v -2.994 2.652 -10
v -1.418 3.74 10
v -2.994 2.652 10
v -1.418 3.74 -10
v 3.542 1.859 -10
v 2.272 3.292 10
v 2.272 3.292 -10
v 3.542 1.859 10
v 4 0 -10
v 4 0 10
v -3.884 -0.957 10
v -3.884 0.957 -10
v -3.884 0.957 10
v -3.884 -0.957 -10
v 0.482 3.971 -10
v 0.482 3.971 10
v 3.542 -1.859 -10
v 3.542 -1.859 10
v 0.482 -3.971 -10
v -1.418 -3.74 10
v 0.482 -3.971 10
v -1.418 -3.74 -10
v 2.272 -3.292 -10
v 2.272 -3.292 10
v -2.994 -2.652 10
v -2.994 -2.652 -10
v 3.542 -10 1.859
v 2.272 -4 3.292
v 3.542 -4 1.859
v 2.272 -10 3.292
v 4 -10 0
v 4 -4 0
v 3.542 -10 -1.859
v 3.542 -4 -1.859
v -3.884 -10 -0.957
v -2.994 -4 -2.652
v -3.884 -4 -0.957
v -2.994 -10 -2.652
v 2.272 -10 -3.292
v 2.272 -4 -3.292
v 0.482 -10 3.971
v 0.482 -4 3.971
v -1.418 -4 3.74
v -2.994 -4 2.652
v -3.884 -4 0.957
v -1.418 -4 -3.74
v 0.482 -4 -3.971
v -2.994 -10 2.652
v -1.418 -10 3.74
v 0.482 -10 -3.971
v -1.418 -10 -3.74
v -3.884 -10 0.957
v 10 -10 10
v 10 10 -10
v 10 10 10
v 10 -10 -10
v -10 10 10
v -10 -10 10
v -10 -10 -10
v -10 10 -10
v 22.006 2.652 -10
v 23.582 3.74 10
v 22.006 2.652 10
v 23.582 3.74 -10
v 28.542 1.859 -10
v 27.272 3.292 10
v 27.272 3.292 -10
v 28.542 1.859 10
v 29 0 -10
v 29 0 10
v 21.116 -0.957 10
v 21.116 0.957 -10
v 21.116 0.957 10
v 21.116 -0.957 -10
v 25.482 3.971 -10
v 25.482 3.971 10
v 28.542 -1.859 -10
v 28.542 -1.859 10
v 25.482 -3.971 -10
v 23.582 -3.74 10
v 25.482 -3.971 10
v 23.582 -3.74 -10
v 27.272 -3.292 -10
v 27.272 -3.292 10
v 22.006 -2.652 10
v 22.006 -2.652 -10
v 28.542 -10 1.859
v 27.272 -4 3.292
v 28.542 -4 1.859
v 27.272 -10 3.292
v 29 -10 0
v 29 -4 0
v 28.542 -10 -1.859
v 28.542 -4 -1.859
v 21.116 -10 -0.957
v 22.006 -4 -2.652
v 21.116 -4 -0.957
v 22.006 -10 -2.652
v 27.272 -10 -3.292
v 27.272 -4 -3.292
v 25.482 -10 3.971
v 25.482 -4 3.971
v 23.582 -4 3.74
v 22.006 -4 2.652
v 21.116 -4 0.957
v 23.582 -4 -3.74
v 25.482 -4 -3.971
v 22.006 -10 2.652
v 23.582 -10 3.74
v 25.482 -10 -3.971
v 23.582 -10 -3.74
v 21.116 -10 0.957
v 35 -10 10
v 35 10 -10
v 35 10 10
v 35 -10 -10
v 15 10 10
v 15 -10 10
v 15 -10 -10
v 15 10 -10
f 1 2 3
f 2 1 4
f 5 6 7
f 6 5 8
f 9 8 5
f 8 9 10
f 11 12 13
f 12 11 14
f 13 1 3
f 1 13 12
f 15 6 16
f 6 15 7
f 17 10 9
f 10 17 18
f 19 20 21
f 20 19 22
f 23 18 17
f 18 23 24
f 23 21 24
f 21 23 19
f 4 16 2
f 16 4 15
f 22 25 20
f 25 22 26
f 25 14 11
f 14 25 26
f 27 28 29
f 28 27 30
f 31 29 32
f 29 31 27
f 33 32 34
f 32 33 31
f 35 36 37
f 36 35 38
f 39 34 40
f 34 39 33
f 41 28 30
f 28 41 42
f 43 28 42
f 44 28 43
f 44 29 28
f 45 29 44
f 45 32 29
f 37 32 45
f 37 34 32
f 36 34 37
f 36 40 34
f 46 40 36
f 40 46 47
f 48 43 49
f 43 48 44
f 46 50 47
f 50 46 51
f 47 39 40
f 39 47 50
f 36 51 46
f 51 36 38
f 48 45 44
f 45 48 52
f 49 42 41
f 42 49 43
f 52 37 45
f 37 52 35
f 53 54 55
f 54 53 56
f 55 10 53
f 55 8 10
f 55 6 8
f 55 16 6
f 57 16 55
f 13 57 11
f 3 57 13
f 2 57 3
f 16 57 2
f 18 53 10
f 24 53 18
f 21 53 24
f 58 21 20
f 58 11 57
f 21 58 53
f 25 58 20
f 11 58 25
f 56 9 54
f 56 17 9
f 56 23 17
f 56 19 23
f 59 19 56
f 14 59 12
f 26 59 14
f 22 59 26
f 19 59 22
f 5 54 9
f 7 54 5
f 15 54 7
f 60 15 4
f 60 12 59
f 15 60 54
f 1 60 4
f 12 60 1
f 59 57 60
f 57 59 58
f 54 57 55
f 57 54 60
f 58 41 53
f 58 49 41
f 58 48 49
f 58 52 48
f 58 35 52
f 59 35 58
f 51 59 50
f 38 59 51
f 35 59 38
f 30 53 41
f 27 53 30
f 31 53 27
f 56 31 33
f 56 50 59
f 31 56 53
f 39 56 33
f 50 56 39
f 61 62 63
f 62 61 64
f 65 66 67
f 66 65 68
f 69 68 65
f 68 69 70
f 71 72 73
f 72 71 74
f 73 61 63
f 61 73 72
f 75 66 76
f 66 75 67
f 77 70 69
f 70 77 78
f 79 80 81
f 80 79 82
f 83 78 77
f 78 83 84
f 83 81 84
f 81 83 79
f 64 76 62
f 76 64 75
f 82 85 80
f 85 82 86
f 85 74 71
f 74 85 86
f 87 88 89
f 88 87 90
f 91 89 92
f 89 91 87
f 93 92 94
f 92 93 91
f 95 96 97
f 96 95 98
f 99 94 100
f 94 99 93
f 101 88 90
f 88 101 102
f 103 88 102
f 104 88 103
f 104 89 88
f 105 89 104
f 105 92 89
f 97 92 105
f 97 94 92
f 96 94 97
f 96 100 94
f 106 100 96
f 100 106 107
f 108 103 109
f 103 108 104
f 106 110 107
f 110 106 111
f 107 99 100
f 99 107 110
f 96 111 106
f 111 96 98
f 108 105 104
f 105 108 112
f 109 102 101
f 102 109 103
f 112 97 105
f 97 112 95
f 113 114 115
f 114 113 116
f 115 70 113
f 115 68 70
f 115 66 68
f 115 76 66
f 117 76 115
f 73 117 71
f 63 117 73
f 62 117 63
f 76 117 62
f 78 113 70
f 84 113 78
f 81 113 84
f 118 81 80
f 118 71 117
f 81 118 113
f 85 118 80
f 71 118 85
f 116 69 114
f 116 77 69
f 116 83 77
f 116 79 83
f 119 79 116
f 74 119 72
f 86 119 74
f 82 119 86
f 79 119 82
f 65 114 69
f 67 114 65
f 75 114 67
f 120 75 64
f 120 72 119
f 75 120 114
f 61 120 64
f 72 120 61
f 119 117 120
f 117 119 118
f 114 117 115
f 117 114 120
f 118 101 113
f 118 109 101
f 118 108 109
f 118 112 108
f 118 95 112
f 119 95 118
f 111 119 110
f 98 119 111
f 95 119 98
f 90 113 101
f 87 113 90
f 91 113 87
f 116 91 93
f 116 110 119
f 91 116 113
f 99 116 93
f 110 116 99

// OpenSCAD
for(x=[0:1]) for(y=[0]) translate([x,y]*25)
difference(){
	cube(20,center=true);
	union(){
		cylinder(r=8/2,h=100,center=true);
		rotate([90,0]) translate([0,0,8/2]) cylinder(r=8/2,h=100);
	}
}
